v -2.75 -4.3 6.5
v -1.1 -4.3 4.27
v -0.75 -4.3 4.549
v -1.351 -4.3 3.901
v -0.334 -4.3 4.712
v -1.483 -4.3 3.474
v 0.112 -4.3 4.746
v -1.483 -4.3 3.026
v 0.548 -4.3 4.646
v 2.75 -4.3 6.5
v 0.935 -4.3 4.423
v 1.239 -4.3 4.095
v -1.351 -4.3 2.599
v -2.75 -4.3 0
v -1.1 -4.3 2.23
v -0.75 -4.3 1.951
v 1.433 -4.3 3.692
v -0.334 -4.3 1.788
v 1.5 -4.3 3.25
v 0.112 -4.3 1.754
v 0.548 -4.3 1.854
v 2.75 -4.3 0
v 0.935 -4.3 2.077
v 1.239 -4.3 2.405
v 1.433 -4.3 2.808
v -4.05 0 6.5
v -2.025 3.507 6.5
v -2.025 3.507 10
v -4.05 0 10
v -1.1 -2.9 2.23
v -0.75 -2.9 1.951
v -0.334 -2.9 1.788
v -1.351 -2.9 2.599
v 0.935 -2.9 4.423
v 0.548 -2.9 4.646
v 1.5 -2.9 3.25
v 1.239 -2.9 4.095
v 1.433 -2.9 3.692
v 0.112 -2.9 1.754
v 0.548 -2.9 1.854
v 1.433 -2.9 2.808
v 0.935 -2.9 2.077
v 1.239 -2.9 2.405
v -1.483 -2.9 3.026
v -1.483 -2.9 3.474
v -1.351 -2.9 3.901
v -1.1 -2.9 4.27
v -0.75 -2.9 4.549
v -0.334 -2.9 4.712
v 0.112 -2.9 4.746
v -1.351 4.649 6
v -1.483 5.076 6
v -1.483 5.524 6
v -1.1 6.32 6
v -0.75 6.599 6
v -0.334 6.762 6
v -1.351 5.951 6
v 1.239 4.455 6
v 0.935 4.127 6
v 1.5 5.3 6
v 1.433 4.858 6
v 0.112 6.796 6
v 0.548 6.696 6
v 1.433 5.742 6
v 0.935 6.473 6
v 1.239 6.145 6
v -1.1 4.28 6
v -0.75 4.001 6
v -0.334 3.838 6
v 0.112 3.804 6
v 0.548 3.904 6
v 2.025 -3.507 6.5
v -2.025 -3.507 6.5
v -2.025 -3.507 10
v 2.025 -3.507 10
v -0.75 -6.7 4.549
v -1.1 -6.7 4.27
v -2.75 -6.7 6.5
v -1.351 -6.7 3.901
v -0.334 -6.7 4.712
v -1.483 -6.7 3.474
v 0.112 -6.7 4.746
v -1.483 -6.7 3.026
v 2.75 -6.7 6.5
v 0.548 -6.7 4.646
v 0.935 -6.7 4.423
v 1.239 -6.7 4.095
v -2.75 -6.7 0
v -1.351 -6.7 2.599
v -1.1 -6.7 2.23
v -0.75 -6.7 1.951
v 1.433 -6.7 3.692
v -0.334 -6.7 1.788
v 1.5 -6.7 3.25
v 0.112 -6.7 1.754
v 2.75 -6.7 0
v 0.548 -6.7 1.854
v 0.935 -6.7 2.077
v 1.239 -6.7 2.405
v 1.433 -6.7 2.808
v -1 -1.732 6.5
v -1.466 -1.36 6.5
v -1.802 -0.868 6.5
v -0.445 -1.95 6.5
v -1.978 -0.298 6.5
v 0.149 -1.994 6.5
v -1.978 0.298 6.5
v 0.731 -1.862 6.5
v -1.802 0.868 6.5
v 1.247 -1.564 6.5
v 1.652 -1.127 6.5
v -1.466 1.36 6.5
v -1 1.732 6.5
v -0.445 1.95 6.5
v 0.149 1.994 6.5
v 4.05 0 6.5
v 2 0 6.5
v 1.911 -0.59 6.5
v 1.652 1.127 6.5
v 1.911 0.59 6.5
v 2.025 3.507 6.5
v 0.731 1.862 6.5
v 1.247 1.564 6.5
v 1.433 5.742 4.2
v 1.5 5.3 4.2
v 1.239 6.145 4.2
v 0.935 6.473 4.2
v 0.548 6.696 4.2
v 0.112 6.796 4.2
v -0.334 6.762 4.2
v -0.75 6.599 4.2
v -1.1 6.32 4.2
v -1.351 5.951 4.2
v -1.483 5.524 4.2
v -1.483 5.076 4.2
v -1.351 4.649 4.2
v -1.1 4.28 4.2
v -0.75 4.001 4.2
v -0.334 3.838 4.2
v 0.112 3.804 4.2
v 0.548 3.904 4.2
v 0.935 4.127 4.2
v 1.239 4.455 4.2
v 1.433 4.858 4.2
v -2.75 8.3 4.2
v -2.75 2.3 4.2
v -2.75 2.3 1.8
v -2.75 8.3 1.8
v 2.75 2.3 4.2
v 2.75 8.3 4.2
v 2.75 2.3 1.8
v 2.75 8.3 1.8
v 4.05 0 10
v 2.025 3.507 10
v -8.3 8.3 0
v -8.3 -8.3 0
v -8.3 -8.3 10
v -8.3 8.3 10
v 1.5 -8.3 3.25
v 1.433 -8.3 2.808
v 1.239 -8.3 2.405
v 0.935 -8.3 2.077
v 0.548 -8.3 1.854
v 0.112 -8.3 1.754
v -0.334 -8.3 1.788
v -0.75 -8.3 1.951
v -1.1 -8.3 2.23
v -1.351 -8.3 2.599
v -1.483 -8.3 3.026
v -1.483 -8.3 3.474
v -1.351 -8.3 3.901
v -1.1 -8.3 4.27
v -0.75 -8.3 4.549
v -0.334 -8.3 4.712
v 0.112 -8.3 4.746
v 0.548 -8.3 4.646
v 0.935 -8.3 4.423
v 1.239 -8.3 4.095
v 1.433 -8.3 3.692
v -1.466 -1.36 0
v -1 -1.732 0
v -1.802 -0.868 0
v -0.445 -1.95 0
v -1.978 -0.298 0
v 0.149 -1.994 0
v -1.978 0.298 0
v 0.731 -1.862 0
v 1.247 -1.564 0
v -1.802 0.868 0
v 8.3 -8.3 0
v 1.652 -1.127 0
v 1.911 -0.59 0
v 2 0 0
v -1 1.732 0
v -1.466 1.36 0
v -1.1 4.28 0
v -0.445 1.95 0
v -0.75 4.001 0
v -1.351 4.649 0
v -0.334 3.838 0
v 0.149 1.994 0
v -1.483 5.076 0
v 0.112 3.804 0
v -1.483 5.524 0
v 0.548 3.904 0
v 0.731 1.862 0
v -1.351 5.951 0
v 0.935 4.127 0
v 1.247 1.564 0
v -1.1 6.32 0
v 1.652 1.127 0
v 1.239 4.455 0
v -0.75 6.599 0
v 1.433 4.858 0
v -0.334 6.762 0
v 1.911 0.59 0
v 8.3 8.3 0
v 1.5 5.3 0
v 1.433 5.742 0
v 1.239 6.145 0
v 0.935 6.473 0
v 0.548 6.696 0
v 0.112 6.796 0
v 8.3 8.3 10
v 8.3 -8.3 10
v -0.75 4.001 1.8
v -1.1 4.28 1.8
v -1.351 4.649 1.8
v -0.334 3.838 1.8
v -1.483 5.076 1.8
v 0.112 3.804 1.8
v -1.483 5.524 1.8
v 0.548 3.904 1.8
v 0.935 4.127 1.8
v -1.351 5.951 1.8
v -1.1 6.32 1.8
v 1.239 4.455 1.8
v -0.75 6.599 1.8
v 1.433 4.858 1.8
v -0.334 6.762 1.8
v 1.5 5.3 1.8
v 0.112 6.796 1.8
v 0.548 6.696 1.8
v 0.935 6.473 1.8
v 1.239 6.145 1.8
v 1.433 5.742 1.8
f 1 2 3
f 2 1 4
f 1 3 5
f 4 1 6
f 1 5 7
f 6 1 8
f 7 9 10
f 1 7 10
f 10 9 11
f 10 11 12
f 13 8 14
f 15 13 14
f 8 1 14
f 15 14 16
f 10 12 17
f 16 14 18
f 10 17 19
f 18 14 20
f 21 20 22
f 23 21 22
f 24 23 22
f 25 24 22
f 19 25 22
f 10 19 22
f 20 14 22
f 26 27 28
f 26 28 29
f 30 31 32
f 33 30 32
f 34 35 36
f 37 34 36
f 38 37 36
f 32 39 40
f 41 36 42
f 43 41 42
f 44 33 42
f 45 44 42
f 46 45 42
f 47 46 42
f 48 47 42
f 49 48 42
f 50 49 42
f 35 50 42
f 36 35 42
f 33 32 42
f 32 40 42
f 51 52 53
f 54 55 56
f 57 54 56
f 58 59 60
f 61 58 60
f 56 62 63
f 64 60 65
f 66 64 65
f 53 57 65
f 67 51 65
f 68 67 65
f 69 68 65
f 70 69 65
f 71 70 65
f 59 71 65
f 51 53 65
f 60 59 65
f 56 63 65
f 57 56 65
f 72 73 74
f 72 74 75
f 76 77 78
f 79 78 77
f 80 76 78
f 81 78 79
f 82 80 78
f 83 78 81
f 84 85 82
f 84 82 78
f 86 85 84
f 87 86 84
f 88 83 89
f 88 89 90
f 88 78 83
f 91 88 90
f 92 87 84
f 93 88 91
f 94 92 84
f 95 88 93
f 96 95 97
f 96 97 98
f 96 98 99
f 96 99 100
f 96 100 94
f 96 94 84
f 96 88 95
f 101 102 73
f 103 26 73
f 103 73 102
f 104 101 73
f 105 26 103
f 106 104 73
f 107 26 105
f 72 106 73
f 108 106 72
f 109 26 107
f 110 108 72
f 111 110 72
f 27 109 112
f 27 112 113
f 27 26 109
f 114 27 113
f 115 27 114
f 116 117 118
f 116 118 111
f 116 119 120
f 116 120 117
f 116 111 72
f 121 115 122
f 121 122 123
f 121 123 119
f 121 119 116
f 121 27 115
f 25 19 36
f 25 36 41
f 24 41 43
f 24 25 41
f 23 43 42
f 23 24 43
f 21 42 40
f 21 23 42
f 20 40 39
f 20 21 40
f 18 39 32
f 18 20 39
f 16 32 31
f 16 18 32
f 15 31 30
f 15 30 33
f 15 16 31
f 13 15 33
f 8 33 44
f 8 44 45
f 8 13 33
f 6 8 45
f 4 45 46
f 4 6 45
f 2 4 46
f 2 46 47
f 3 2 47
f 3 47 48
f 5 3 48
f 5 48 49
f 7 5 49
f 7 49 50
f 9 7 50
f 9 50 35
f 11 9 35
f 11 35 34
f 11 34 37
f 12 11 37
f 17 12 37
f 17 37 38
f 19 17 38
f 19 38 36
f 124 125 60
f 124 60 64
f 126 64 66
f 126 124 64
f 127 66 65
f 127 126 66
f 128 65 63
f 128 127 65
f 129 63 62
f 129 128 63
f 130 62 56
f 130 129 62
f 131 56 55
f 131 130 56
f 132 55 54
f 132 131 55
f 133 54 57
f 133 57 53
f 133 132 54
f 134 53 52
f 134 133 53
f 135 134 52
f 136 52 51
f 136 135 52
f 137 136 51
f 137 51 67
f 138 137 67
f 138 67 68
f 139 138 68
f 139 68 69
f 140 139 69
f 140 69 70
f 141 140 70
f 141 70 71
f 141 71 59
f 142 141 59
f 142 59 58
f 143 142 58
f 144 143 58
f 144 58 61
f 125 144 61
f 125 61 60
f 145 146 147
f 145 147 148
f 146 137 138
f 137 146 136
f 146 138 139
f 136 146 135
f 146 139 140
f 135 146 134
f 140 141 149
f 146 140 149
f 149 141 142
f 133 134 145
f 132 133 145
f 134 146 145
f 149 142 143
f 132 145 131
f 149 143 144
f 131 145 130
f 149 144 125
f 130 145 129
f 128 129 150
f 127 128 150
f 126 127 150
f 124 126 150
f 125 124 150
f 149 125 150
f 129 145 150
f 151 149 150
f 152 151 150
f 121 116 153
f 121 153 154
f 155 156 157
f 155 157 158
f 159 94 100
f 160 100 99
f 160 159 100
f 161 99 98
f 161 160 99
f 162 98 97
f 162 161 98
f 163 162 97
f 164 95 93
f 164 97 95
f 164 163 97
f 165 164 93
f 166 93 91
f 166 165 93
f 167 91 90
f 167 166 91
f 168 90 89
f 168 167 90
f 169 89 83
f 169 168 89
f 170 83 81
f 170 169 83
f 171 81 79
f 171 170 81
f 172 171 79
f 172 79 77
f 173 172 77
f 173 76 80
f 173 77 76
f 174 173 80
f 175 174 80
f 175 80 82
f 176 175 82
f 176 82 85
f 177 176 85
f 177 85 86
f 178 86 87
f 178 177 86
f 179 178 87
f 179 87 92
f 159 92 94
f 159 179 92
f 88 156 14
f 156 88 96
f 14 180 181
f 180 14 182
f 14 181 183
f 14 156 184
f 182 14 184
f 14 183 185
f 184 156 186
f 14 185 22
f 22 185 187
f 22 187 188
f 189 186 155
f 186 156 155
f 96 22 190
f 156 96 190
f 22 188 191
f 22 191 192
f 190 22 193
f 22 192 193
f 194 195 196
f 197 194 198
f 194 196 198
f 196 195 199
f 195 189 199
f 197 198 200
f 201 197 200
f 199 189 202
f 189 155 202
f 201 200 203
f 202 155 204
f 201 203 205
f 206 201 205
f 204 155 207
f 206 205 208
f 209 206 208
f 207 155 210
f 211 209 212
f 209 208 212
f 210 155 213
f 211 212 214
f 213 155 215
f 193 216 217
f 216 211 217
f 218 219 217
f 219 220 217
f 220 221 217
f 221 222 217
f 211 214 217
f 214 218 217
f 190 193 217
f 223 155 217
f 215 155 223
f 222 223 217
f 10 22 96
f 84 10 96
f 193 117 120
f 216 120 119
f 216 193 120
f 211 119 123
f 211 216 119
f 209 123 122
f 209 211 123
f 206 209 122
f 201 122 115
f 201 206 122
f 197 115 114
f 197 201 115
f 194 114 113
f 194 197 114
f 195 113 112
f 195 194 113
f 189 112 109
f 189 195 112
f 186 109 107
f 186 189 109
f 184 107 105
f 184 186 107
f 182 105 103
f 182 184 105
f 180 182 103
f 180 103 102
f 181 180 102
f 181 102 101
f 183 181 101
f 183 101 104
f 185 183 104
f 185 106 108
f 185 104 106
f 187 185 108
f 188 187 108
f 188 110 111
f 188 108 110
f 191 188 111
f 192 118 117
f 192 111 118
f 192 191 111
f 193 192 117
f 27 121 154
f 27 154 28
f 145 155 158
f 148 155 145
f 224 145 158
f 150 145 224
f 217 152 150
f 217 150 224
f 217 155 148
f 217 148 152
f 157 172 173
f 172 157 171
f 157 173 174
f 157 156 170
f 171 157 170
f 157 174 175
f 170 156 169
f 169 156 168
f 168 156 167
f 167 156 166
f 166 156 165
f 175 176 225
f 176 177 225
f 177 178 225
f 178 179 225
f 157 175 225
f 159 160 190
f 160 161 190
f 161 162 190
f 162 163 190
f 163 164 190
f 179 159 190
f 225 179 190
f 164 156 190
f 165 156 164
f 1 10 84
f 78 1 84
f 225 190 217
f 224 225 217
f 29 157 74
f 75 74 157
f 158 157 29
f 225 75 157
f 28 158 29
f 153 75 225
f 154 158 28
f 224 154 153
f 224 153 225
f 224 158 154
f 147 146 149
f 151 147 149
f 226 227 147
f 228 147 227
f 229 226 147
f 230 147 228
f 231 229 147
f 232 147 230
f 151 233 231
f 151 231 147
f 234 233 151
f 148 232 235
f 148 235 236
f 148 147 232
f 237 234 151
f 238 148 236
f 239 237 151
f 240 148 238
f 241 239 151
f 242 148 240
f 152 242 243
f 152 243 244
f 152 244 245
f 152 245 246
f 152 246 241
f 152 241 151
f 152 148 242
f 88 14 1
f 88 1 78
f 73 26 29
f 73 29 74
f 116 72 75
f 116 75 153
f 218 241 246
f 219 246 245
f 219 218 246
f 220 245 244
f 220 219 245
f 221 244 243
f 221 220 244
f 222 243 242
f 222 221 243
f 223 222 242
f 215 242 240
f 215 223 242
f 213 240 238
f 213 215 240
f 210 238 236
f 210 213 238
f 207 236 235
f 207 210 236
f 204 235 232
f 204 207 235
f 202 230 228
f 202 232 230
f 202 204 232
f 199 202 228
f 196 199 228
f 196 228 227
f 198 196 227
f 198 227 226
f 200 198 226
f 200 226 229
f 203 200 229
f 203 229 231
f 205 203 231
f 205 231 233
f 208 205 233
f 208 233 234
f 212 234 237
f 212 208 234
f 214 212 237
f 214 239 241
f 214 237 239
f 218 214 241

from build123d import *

# Parameters (mm, degrees)
CYLINDER_R        = 2
CYLINDER_DEPTH    = 10
PAD001_DEPTH      = 3.5
BOX_W             = 2.4
BOX_H             = 5.5
BOX_DEPTH         = 6.5
CYLINDER003_R     = 1.5
CYLINDER003_DEPTH = 5.4
CYLINDER001_R     = 1.5
CYLINDER001_DEPTH = 6
SKETCH002_W       = 5.5
SKETCH002_H       = 6
PAD002_DEPTH      = 1.2
SKETCH_W          = 16.6
SKETCH_H          = 16.6
PAD_DEPTH         = 10


with BuildPart() as cylinder:
    # Cylinder → Cylinder (new body)
    with BuildSketch(Plane.XY):
        Circle(CYLINDER_R)
    extrude(amount=CYLINDER_DEPTH)


with BuildPart() as fusion001:
    # Sketch001 → Pad001 (new body)
    with BuildSketch(Plane.XY):
        Polygon((-4.05, 0), (-2.025, -3.507403), (2.025, -3.507403), (4.05, 0), (2.025, 3.507403), (-2.025, 3.507403), align=None)
    extrude(amount=PAD001_DEPTH)


with BuildPart() as fusion001_1:
    # Body001 placement: moved
    add(fusion001.part.moved(Location((0, 0, 6.5))))

    # Fusion001: union Cylinder
    add(cylinder.part)


with BuildPart() as cube:
    # Box → Box (new body)
    with BuildSketch(Plane(origin=(-2.75, -4.5, 0), x_dir=(0, -1, 0), z_dir=(0, 0, 1))):
        with Locations((1.2, 2.75)):
            Rectangle(BOX_W, BOX_H)
    extrude(amount=BOX_DEPTH)


with BuildPart() as fusion:
    # Cylinder003 → Cylinder003 (new body)
    with BuildSketch(Plane(origin=(0, -8.5, 3.25), x_dir=(1, 0, 0), z_dir=(0, 1, 0))):
        Circle(CYLINDER003_R)
    extrude(amount=CYLINDER003_DEPTH)

    # Fusion: union Cube
    add(cube.part)


with BuildPart() as fusion_1:
    # Fusion placement: moved
    add(fusion.part.moved(Location((0, 0.2, 0))))


with BuildPart() as cylinder001:
    # Cylinder001 → Cylinder001 (new body)
    with BuildSketch(Plane(origin=(0, 3, -3), x_dir=(1, 0, 0), z_dir=(0, 0, 1))):
        Circle(CYLINDER001_R)
    extrude(amount=CYLINDER001_DEPTH)


with BuildPart() as fusion003:
    # Sketch002 → Pad002 (new body, symmetric)
    with BuildSketch(Plane.XY):
        with Locations((0, 3)):
            Rectangle(SKETCH002_W, SKETCH002_H)
    extrude(amount=PAD002_DEPTH, both=True)

    # Fusion002: union Cylinder001
    add(cylinder001.part)


with BuildPart() as fusion003_1:
    # Fusion002 placement: moved
    add(fusion003.part.moved(Location((0, 2.3, 3))))

    # Fusion003: union Fusion001, Fusion
    add(fusion001_1.part)
    add(fusion_1.part)


with BuildPart() as cut:
    # Sketch → Pad (new body)
    with BuildSketch(Plane.XY):
        Rectangle(SKETCH_W, SKETCH_H)
    extrude(amount=PAD_DEPTH)

    # Cut: cut Fusion003
    add(fusion003_1.part, mode=Mode.SUBTRACT)


solid = cut.part
